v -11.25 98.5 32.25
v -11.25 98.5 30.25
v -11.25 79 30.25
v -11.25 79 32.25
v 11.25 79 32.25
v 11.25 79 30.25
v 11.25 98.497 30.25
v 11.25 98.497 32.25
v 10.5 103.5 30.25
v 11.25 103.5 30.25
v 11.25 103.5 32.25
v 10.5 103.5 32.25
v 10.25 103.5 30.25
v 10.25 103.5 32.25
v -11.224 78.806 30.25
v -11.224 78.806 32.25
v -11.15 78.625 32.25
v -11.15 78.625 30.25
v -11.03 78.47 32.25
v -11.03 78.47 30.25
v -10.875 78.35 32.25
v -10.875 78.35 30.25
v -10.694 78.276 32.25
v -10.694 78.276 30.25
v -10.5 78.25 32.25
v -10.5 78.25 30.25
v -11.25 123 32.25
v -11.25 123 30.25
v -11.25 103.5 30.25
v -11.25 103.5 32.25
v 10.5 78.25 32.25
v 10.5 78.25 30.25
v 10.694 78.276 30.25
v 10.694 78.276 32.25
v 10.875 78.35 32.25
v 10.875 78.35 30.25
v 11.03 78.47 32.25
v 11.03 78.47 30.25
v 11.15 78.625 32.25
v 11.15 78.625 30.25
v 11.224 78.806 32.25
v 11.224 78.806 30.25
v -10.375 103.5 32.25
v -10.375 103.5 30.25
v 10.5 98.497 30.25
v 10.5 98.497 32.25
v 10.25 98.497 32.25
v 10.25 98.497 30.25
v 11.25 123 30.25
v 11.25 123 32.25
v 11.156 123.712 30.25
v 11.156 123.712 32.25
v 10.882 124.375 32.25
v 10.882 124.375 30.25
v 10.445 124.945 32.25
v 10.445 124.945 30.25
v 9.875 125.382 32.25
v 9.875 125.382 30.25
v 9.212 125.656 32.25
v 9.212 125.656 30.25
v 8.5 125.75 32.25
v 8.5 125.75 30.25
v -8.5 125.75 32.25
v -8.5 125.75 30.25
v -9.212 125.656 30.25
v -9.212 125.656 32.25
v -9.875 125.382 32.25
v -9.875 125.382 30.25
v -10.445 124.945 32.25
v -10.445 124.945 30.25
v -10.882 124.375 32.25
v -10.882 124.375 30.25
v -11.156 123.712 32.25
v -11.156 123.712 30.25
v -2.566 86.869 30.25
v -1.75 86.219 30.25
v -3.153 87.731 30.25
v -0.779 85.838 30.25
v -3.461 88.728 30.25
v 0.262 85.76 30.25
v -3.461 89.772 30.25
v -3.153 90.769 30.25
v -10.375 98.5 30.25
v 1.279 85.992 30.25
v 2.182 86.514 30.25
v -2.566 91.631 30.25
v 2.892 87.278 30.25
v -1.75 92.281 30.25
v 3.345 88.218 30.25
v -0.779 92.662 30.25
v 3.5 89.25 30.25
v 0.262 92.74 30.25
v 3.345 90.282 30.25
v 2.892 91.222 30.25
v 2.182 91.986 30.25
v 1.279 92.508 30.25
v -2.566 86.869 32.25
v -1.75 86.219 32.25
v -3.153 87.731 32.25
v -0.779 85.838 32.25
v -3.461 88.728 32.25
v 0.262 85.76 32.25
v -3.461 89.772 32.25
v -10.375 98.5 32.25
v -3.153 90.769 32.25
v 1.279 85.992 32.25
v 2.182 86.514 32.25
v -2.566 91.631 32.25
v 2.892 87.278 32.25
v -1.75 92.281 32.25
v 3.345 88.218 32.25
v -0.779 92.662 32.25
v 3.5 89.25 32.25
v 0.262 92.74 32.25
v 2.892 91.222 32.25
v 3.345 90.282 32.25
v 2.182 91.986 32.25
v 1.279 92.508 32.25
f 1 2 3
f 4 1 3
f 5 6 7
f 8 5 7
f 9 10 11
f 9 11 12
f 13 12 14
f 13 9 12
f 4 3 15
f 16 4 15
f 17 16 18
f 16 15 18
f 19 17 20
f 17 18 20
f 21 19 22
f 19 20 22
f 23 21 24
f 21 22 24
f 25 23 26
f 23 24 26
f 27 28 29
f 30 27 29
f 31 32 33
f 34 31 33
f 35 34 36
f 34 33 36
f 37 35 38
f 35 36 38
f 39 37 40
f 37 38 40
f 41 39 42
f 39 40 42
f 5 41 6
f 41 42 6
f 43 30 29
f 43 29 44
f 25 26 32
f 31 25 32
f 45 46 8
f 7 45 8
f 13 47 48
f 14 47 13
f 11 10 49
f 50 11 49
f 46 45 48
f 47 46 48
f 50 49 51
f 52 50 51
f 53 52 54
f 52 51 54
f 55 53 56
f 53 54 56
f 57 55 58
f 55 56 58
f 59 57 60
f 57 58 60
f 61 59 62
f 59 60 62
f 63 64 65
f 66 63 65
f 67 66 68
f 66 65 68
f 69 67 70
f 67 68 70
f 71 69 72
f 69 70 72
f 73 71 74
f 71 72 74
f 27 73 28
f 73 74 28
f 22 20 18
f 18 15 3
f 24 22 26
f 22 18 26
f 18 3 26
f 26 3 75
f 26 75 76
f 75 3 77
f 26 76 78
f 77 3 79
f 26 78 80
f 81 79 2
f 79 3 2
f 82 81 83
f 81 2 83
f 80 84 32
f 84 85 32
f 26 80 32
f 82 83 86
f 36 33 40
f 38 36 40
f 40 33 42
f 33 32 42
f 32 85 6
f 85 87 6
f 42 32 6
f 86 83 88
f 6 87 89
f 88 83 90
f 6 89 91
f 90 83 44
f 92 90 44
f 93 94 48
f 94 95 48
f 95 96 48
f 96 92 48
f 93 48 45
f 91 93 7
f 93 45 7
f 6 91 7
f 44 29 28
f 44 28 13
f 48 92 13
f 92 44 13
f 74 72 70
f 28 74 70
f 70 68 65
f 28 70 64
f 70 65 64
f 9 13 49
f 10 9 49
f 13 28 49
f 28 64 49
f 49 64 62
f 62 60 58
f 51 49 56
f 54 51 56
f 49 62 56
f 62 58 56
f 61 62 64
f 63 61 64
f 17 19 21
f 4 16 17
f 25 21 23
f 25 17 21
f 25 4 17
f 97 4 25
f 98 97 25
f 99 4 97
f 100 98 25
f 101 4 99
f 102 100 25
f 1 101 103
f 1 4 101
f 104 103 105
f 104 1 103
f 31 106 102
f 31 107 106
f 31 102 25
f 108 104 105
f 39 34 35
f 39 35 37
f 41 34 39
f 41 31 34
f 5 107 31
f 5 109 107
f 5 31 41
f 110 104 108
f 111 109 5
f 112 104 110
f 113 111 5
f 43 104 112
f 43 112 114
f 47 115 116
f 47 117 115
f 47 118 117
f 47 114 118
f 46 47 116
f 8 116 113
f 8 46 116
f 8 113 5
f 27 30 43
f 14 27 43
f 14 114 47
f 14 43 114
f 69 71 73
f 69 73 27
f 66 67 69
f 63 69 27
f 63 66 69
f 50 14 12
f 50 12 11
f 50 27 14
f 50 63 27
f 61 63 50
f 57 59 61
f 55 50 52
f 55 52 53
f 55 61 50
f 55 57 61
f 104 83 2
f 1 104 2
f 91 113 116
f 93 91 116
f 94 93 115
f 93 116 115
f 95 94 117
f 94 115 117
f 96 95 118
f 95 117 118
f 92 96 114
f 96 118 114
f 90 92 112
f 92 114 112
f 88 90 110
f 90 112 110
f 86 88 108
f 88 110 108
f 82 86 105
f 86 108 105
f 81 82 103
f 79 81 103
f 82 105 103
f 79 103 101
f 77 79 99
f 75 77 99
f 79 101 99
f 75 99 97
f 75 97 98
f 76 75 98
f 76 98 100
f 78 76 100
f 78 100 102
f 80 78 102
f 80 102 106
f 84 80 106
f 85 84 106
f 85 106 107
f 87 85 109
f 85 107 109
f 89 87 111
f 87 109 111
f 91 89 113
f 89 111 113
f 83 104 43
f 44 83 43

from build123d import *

# Parameters (mm, degrees)
SKETCH1_W                = 20
SKETCH1_H                = 20
SKETCH1_R                = 4
SKETCH1_H_2              = 10
BOSS_EXTRUDE2_DEPTH      = 2
SKETCH2_W                = 45
SKETCH2_H                = 60
SKETCH2_W_2              = 43
SKETCH2_H_2              = 58
BOSS_EXTRUDE3_DEPTH      = 4
SKETCH6_W                = 45
SKETCH6_H                = 30
BOSS_EXTRUDE4_DEPTH      = 2
CUT_EXTRUDE4_DEPTH       = 4
BOSS_EXTRUDE5_DEPTH      = 7
BOSS_EXTRUDE5_2_DEPTH    = 7
BOSS_EXTRUDE5_3_DEPTH    = 7
SKETCH11_W               = 19
SKETCH11_H               = 19
BOSS_EXTRUDE6_DEPTH      = 2
SKETCH14_R               = 4
CUT_EXTRUDE7_DEPTH       = 19
SKETCH15_W               = 1
SKETCH15_H               = 17
SKETCH15_H_2             = 1
BOSS_EXTRUDE7_DEPTH      = 80
SKETCH16_W               = 16.5
SKETCH16_H               = 16.5
BOSS_EXTRUDE8_DEPTH      = 80
SKETCH17_R               = 4
CUT_EXTRUDE8_DEPTH       = 193
SKETCH18_W               = 105.72576136
SKETCH18_H               = 91
CUT_EXTRUDE9_DEPTH       = 193
SKETCH19_W               = 10.5
SKETCH19_H               = 2
CUT_EXTRUDE10_DEPTH      = 193
SKETCH20_W               = 16.5
SKETCH20_H               = 16.5
SKETCH20_R               = 4
BOSS_EXTRUDE10_DEPTH     = 80
SKETCH21_W               = 16.5
SKETCH21_H               = 16.5
SKETCH21_R               = 4
CUT_EXTRUDE11_DEPTH      = 80
SKETCH22_W               = 14
SKETCH22_H               = 5
CUT_EXTRUDE12_DEPTH      = 16
SKETCH24_W               = 16.5
SKETCH24_H               = 80
SKETCH24_W_2             = 14
SKETCH24_H_2             = 5
BOSS_EXTRUDE11_DEPTH     = 2
SKETCH25_R               = 4.1
SKETCH25_R_2             = 4
CUT_EXTRUDE14_DEPTH      = 103
SKETCH26_W               = 35
SKETCH26_H               = 40
BOSS_EXTRUDE12_DEPTH     = 5
SKETCH27_W               = 23
SKETCH27_H               = 5.75
CUT_EXTRUDE17_DEPTH      = 5
SKETCH28_W               = 2
SKETCH28_H               = 40
BOSS_EXTRUDE13_DEPTH     = 32
SKETCH29_W               = 4
SKETCH29_H               = 40
CUT_EXTRUDE18_DEPTH      = 32
SKETCH30_W               = 4
SKETCH30_H               = 40
CUT_EXTRUDE19_DEPTH      = 32
SKETCH31_W               = 10
SKETCH31_H               = 2
CUT_EXTRUDE20_DEPTH      = 32
SKETCH34_W               = 44.25
SKETCH34_H               = 2
BOSS_EXTRUDE15_DEPTH     = 23
FILLET1_R                = 3
FILLET2_R                = 3
FILLET3_R                = 3
FILLET4_R                = 3
BOSS_EXTRUDE16_DEPTH     = 20
SKETCH36_W               = 10
SKETCH36_H               = 2
BOSS_EXTRUDE17_DEPTH     = 23
SKETCH37_W               = 27
SKETCH37_H               = 20
CUT_EXTRUDE23_DEPTH      = 1
SKETCH42_W               = 1
SKETCH42_H               = 5
BOSS_EXTRUDE22_DEPTH     = 2
SKETCH44_W               = 1
SKETCH44_H               = 2
BOSS_EXTRUDE23_DEPTH     = 2
SKETCH46_W               = 1
SKETCH46_H               = 2
BOSS_EXTRUDE24_DEPTH     = 3
SKETCH47_W               = 16.5
SKETCH47_H               = 18.5
SKETCH47_R               = 4.1
BOSS_EXTRUDE25_DEPTH     = 2
SKETCH50_W               = 14
SKETCH50_H               = 18
SKETCH50_R               = 4.1
CUT_EXTRUDE26_DEPTH      = 2
SKETCH51_W               = 18
SKETCH51_H               = 7
CUT_EXTRUDE27_DEPTH      = 0.5
SKETCH52_W               = 18
SKETCH52_H               = 7
CUT_EXTRUDE28_DEPTH      = 0.5
SKETCH53_W               = 18.5
SKETCH53_H               = 82
BOSS_EXTRUDE26_DEPTH     = 0.5
SKETCH54_W               = 18.5
SKETCH54_H               = 82
BOSS_EXTRUDE27_DEPTH     = 0.5
BOSS_EXTRUDE30_DEPTH     = 5
CUT_EXTRUDE31_REACH      = 138.104
SKETCH61_W               = 23
SKETCH61_H               = 5
CUT_EXTRUDE32_DEPTH      = 25
CUT_EXTRUDE32_DEPTH_BACK = 5
SKETCH62_W               = 6.75
SKETCH62_H               = 5
BOSS_EXTRUDE31_DEPTH     = 10.25
BOSS_EXTRUDE32_DEPTH     = 6
SKETCH65_W               = 23
SKETCH65_H               = 2
BOSS_EXTRUDE33_DEPTH     = 6
FILLET5_R                = 3
FILLET6_R                = 3
FILLET7_R                = 1
FILLET8_R                = 1
SKETCH66_W               = 1
SKETCH66_H               = 1
CUT_EXTRUDE33_DEPTH      = 5
BOSS_EXTRUDE34_DEPTH     = 6
SKETCH68_W               = 17
SKETCH68_H               = 15
BOSS_EXTRUDE35_DEPTH     = 6
BOSS_EXTRUDE37_DEPTH     = 15
SKETCH72_W               = 3
SKETCH72_H               = 15
BOSS_EXTRUDE38_DEPTH     = 3
SKETCH75_W               = 6.5
SKETCH75_H               = 31.5
BOSS_EXTRUDE39_DEPTH     = 2
SKETCH76_W               = 6.5
SKETCH76_H               = 2
BOSS_EXTRUDE40_DEPTH     = 31.5
SKETCH77_W               = 1
SKETCH77_H               = 5.002530781
SKETCH77_H_2             = 5
CUT_EXTRUDE34_DEPTH      = 8
SKETCH78_W               = 0.75
SKETCH78_H               = 5.002565684
SKETCH78_H_2             = 5
CUT_EXTRUDE35_DEPTH      = 2
SKETCH79_W               = 0.75
SKETCH79_H               = 5.002530781
SKETCH79_W_2             = 0.875
SKETCH79_H_2             = 5
BOSS_EXTRUDE42_DEPTH     = 2
SKETCH80_R               = 3.5
CUT_EXTRUDE37_DEPTH      = 2
CUT_EXTRUDE38_DEPTH      = 32


with BuildPart() as part:
    # Sketch1 → Boss-Extrude2 (new body)
    # profile 1 of 6: a face of its own
    with BuildSketch(Plane(origin=(0, 0, 0), x_dir=(1, 0, 0), z_dir=(0, 1, 0))):
        Polygon((-22.5, 10), (-10, 10), (10, 10), (22.5, 10), (22.5, 70), (-22.5, 70), align=None)
    # profile 2 of 6: a face of its own
    with BuildSketch(Plane(origin=(0, 0, 0), x_dir=(1, 0, 0), z_dir=(0, 1, 0))):
        Polygon((-22.5, 10), (-10, -10), (-10, 10), align=None)
    # profile 3 of 6: a face of its own
    with BuildSketch(Plane(origin=(0, 0, 0), x_dir=(1, 0, 0), z_dir=(0, 1, 0))):
        Polygon((10, 10), (10, -10), (22.5, 10), align=None)
    # profile 4 of 6: a face of its own
    with BuildSketch(Plane(origin=(0, 0, 0), x_dir=(1, 0, 0), z_dir=(0, 1, 0))):
        Rectangle(SKETCH1_W, SKETCH1_H)
        Circle(SKETCH1_R, mode=Mode.SUBTRACT)
    # profile 5 of 6: a face of its own
    with BuildSketch(Plane(origin=(0, 0, 0), x_dir=(1, 0, 0), z_dir=(0, 1, 0))):
        Circle(SKETCH1_R)
    # profile 6 of 6: a face of its own
    with BuildSketch(Plane(origin=(0, 0, 0), x_dir=(1, 0, 0), z_dir=(0, 1, 0))):
        with Locations((0, -15)):
            Rectangle(SKETCH1_W, SKETCH1_H_2)
    extrude(amount=BOSS_EXTRUDE2_DEPTH)

    # Sketch2 → Boss-Extrude3 (add)
    with BuildSketch(Plane(origin=(0, 2, 0), x_dir=(1, 0, 0), z_dir=(0, 1, 0))):
        with Locations((0, 40)):
            Rectangle(SKETCH2_W, SKETCH2_H)
        with Locations((0, 40)):
            Rectangle(SKETCH2_W_2, SKETCH2_H_2, mode=Mode.SUBTRACT)
    extrude(amount=BOSS_EXTRUDE3_DEPTH)

    # Sketch6 → Boss-Extrude4 (add)
    with BuildSketch(Plane(origin=(0, 2, 0), x_dir=(1, 0, 0), z_dir=(0, 1, 0))):
        with Locations((0, -5)):
            Rectangle(SKETCH6_W, SKETCH6_H)
    extrude(amount=-BOSS_EXTRUDE4_DEPTH)

    # Sketch7 → Cut-Extrude4 (cut)
    with BuildSketch(Plane(origin=(0, 2, 0), x_dir=(1, 0, 0), z_dir=(0, 1, 0))):
        with BuildLine():
            Line((9.5, 9.5), (-9.5, 9.5))
            Line((-9.5, 9.5), (-9.5, 2.122498999))
            ThreePointArc((-9.5, 2.122498999), (0, 9), (9.5, 2.122498999))
            Line((9.5, 2.122498999), (9.5, 9.5))
        make_face()
        with BuildLine():
            ThreePointArc((-5.267826876, -9.5), (-7.858215886, -7.184532568), (-9.5, -4.122498999))
            Line((-9.5, -4.122498999), (-9.5, -9.5))
            Line((-9.5, -9.5), (-5.267826876, -9.5))
        make_face()
        with BuildLine():
            Line((9.5, -9.5), (9.5, -4.122498999))
            ThreePointArc((9.5, -4.122498999), (7.858215886, -7.184532568), (5.267826876, -9.5))
            Line((5.267826876, -9.5), (9.5, -9.5))
        make_face()
    extrude(amount=-CUT_EXTRUDE4_DEPTH, mode=Mode.SUBTRACT)


with BuildPart() as body_2:
    # Sketch8 → Boss-Extrude5 (new body)
    with BuildSketch(Plane(origin=(0, 2, 0), x_dir=(1, 0, 0), z_dir=(0, 1, 0))):
        with BuildLine():
            Line((9.5, 2.122498999), (9.5, 9.5))
            Line((9.5, 9.5), (-9.5, 9.5))
            Line((-9.5, 9.5), (-9.5, 2.122498999))
            ThreePointArc((-9.5, 2.122498999), (0, 9), (9.5, 2.122498999))
        make_face()
    extrude(amount=BOSS_EXTRUDE5_DEPTH)



with BuildPart() as body_3:
    # Sketch8 → Boss-Extrude5 2 (new body)
    with BuildSketch(Plane(origin=(0, 2, 0), x_dir=(1, 0, 0), z_dir=(0, 1, 0))):
        with BuildLine():
            Line((-9.5, -9.5), (-5.267826876, -9.5))
            ThreePointArc((-5.267826876, -9.5), (-7.858215886, -7.184532568), (-9.5, -4.122498999))
            Line((-9.5, -4.122498999), (-9.5, -9.5))
        make_face()
    extrude(amount=BOSS_EXTRUDE5_2_DEPTH)


with BuildPart() as body_4:
    # Sketch8 → Boss-Extrude5 3 (new body)
    with BuildSketch(Plane(origin=(0, 2, 0), x_dir=(1, 0, 0), z_dir=(0, 1, 0))):
        with BuildLine():
            Line((9.5, -9.5), (9.5, -4.122498999))
            ThreePointArc((9.5, -4.122498999), (7.858215886, -7.184532568), (5.267826876, -9.5))
            Line((5.267826876, -9.5), (9.5, -9.5))
        make_face()
    extrude(amount=BOSS_EXTRUDE5_3_DEPTH)


with BuildPart() as body_2_1:
    add(body_2.part)

    add(body_3.part)  # Boss-Extrude6 merges body 3

    add(body_4.part)  # Boss-Extrude6 merges body 4
    # Sketch11 → Boss-Extrude6 (add)
    with BuildSketch(Plane(origin=(0, 9, 0), x_dir=(1, 0, 0), z_dir=(0, 1, 0))):
        Rectangle(SKETCH11_W, SKETCH11_H)
    extrude(amount=BOSS_EXTRUDE6_DEPTH)


with BuildPart() as cut_extrude7_tool:
    # Sketch14 → Cut-Extrude7 (new body)
    with BuildSketch(Plane.XZ):
        with Locations(Location((0, 1, 0), (0, 0, 270))):
            Circle(SKETCH14_R)
    extrude(amount=-CUT_EXTRUDE7_DEPTH)


with BuildPart() as part_1:
    add(part.part)

    # Cut-Extrude7: cut by cut_extrude7_tool
    add(cut_extrude7_tool.part, mode=Mode.SUBTRACT)


with BuildPart() as body_2_2:
    add(body_2_1.part)

    # Cut-Extrude7: cut by cut_extrude7_tool
    add(cut_extrude7_tool.part, mode=Mode.SUBTRACT)

    # Sketch15 → Boss-Extrude7 (add)
    with BuildSketch(Plane(origin=(0, 11, 0), x_dir=(1, 0, 0), z_dir=(0, 1, 0))):
        Polygon((-8.5, 8.5), (8.5, 8.5), (8.5, 9.5), (-9.5, 9.5), (-9.5, -9.5), (8.5, -9.5), (8.5, -8.5), (-8.5, -8.5), align=None)
        with Locations((9, 0)):
            Rectangle(SKETCH15_W, SKETCH15_H)
        with Locations((9, 9)):
            Rectangle(SKETCH15_W, SKETCH15_H_2)
        with Locations((9, -9)):
            Rectangle(SKETCH15_W, SKETCH15_H_2)
    extrude(amount=BOSS_EXTRUDE7_DEPTH)


with BuildPart() as body_3_2:
    # Sketch16 → Boss-Extrude8 (new body)
    with BuildSketch(Plane(origin=(0, 91, 0), x_dir=(1, 0, 0), z_dir=(0, 1, 0))):
        Rectangle(SKETCH16_W, SKETCH16_H)
    extrude(amount=BOSS_EXTRUDE8_DEPTH)

    # Sketch17 → Cut-Extrude8 (cut)
    with BuildSketch(Plane.XZ):
        with Locations(Location((0, 1, 0), (0, 0, 270))):
            Circle(SKETCH17_R)
    extrude(amount=-CUT_EXTRUDE8_DEPTH, mode=Mode.SUBTRACT)

    # Sketch20 → Boss-Extrude10 (add)
    with BuildSketch(Plane.XZ.offset(-91)):
        Rectangle(SKETCH20_W, SKETCH20_H)
        with Locations(Location((0, 1, 0), (0, 0, 270))):
            Circle(SKETCH20_R, mode=Mode.SUBTRACT)
    extrude(amount=BOSS_EXTRUDE10_DEPTH)

    # Sketch21 → Cut-Extrude11 (cut)
    with BuildSketch(Plane(origin=(0, 171, 0), x_dir=(1, 0, 0), z_dir=(0, 1, 0))):
        Rectangle(SKETCH21_W, SKETCH21_H)
        with Locations(Location((0, -1, 0), (0, 0, 90))):
            Circle(SKETCH21_R, mode=Mode.SUBTRACT)
    extrude(amount=-CUT_EXTRUDE11_DEPTH, mode=Mode.SUBTRACT)

    # Sketch22 → Cut-Extrude12 (cut)
    with BuildSketch(Plane.XY.offset(8.25)):
        with Locations((0, 15.5)):
            Rectangle(SKETCH22_W, SKETCH22_H)
    extrude(amount=-CUT_EXTRUDE12_DEPTH, mode=Mode.SUBTRACT)

    # Sketch24 → Boss-Extrude11 (add)
    with BuildSketch(Plane.XY.offset(8.25)):
        with Locations((0, 51)):
            Rectangle(SKETCH24_W, SKETCH24_H)
        with Locations((0, 15.5)):
            Rectangle(SKETCH24_W_2, SKETCH24_H_2, mode=Mode.SUBTRACT)
    extrude(amount=BOSS_EXTRUDE11_DEPTH)

    # Sketch25 → Cut-Extrude14 (cut)
    with BuildSketch(Plane(origin=(0, 91, 0), x_dir=(1, 0, 0), z_dir=(0, 1, 0))):
        with Locations(Location((0, -1, 0), (0, 0, 270))):
            Circle(SKETCH25_R)
        with Locations((0, -1)):
            Circle(SKETCH25_R_2, mode=Mode.SUBTRACT)
    extrude(amount=-CUT_EXTRUDE14_DEPTH, mode=Mode.SUBTRACT)

    # Sketch26 → Boss-Extrude12 (add)
    with BuildSketch(Plane(origin=(0, 91, 0), x_dir=(1, 0, 0), z_dir=(0, 1, 0))):
        Rectangle(SKETCH26_W, SKETCH26_H)
    extrude(amount=BOSS_EXTRUDE12_DEPTH)

    # Sketch27 → Cut-Extrude17 (cut)
    with BuildSketch(Plane(origin=(0, 96, 0), x_dir=(1, 0, 0), z_dir=(0, 1, 0))):
        with Locations((0, -17.125)):
            Rectangle(SKETCH27_W, SKETCH27_H)
    extrude(amount=-CUT_EXTRUDE17_DEPTH, mode=Mode.SUBTRACT)

    # Sketch28 → Boss-Extrude13 (add)
    with BuildSketch(Plane(origin=(0, 96, 0), x_dir=(1, 0, 0), z_dir=(0, 1, 0))):
        with Locations((12.5, 0)):
            Rectangle(SKETCH28_W, SKETCH28_H)
        with Locations((-12.5, 0)):
            Rectangle(SKETCH28_W, SKETCH28_H)
    extrude(amount=BOSS_EXTRUDE13_DEPTH)

    # Sketch29 → Cut-Extrude18 (cut)
    with BuildSketch(Plane(origin=(0, 96, 0), x_dir=(1, 0, 0), z_dir=(0, 1, 0))):
        with Locations((-15.5, 0)):
            Rectangle(SKETCH29_W, SKETCH29_H)
    extrude(amount=-CUT_EXTRUDE18_DEPTH, mode=Mode.SUBTRACT)

    # Sketch30 → Cut-Extrude19 (cut)
    with BuildSketch(Plane(origin=(0, 96, 0), x_dir=(1, 0, 0), z_dir=(0, 1, 0))):
        with Locations((15.5, 0)):
            Rectangle(SKETCH30_W, SKETCH30_H)
    extrude(amount=-CUT_EXTRUDE19_DEPTH, mode=Mode.SUBTRACT)

    # Sketch31 → Cut-Extrude20 (cut)
    with BuildSketch(Plane(origin=(0, 96, 0), x_dir=(1, 0, 0), z_dir=(0, 1, 0))):
        with Locations((0, 19)):
            Rectangle(SKETCH31_W, SKETCH31_H)
    extrude(amount=-CUT_EXTRUDE20_DEPTH, mode=Mode.SUBTRACT)

    # Sketch34 → Boss-Extrude15 (add)
    with BuildSketch(Plane.ZY.offset(-11.5)):
        with Locations((2.125, 127)):
            Rectangle(SKETCH34_W, SKETCH34_H)
    extrude(amount=BOSS_EXTRUDE15_DEPTH)

    # Fillet1
    fillet1_edges = [body_3_2.edges().sort_by_distance(p)[0] for p in [
        (-13.5, 128, 0),
    ]]
    fillet(fillet1_edges, radius=FILLET1_R)

    # Fillet2
    fillet2_edges = [body_3_2.edges().sort_by_distance(p)[0] for p in [
        (13.5, 128, 0),
    ]]
    fillet(fillet2_edges, radius=FILLET2_R)

    # Fillet3
    # the kernel refuses this fillet: 3 mm, written as the material it adds along each edge
    with BuildSketch(Plane(origin=(-11.5, 126, 27.5), x_dir=(1, 0, 0), z_dir=(0, 0, -1))) as fillet3_piece_1_section:
        with BuildLine():
            CenterArc((FILLET3_R, FILLET3_R), FILLET3_R, 180, 90)
            Line((0, FILLET3_R), (0, 0))
            Line((0, 0), (FILLET3_R, 0))
        make_face()
    fillet3_piece_1 = extrude(amount=47.5, mode=Mode.PRIVATE)
    fillet3_piece_1 = split(fillet3_piece_1, bisect_by=Plane(origin=(-11.5, 126, 24.25), z_dir=(0, 0, -1)), keep=Keep.TOP, mode=Mode.PRIVATE)
    fillet3_piece_1 = split(fillet3_piece_1, bisect_by=Plane(origin=(-11.5, 126, 27.5), z_dir=(1, 0, 0)), keep=Keep.TOP, mode=Mode.PRIVATE)
    fillet3_piece_1 = split(fillet3_piece_1, bisect_by=Plane(origin=(-11.5, 126, 20), z_dir=(0, 0, 1)), keep=Keep.TOP, mode=Mode.PRIVATE)
    add(fillet3_piece_1)
    with BuildSketch(Plane(origin=(-11.5, 126, 20), x_dir=(1, 0, 0), z_dir=(0, 0, -1))) as fillet3_piece_2_section:
        with BuildLine():
            CenterArc((FILLET3_R, FILLET3_R), FILLET3_R, 180, 90)
            Line((0, FILLET3_R), (0, 0))
            Line((0, 0), (FILLET3_R, 0))
        make_face()
    fillet3_piece_2 = extrude(amount=40, mode=Mode.PRIVATE)
    fillet3_piece_2 = split(fillet3_piece_2, bisect_by=Plane(origin=(-11.5, 126, 20), z_dir=(1, 0, 0)), keep=Keep.TOP, mode=Mode.PRIVATE)
    add(fillet3_piece_2)

    # Fillet4
    # the kernel refuses this fillet: 3 mm, written as the material it adds along each edge
    with BuildSketch(Plane(origin=(11.5, 126, 27.5), x_dir=(0, -1, 0), z_dir=(0, 0, -1))) as fillet4_piece_1_section:
        with BuildLine():
            CenterArc((FILLET4_R, FILLET4_R), FILLET4_R, 180, 90)
            Line((0, FILLET4_R), (0, 0))
            Line((0, 0), (FILLET4_R, 0))
        make_face()
    fillet4_piece_1 = extrude(amount=47.5, mode=Mode.PRIVATE)
    fillet4_piece_1 = split(fillet4_piece_1, bisect_by=Plane(origin=(11.5, 126, 20), z_dir=(0, 0, 1)), keep=Keep.TOP, mode=Mode.PRIVATE)
    fillet4_piece_1 = split(fillet4_piece_1, bisect_by=Plane(origin=(11.5, 126, 27.5), z_dir=(-1, 0, 0)), keep=Keep.TOP, mode=Mode.PRIVATE)
    fillet4_piece_1 = split(fillet4_piece_1, bisect_by=Plane(origin=(11.5, 126, 24.25), z_dir=(0, 0, -1)), keep=Keep.TOP, mode=Mode.PRIVATE)
    add(fillet4_piece_1)
    with BuildSketch(Plane(origin=(11.5, 126, 20), x_dir=(0, -1, 0), z_dir=(0, 0, -1))) as fillet4_piece_2_section:
        with BuildLine():
            CenterArc((FILLET4_R, FILLET4_R), FILLET4_R, 180, 90)
            Line((0, FILLET4_R), (0, 0))
            Line((0, 0), (FILLET4_R, 0))
        make_face()
    fillet4_piece_2 = extrude(amount=40, mode=Mode.PRIVATE)
    fillet4_piece_2 = split(fillet4_piece_2, bisect_by=Plane(origin=(11.5, 126, 20), z_dir=(-1, 0, 0)), keep=Keep.TOP, mode=Mode.PRIVATE)
    add(fillet4_piece_2)

    # Boss-Extrude16: read off the stored shape, not the designer's step
    # Boss-Extrude16 outline → Boss-Extrude16 (add)
    with BuildSketch(Plane.XZ.offset(-91)):
        Polygon((11.5, 20), (11.5, 14.25), (-11.5, 14.25), (-11.5, 20), (-13.5, 20), (-13.5, 12.25), (13.5, 12.25), (13.5, 20), align=None)
    extrude(amount=BOSS_EXTRUDE16_DEPTH)

    # Sketch36 → Boss-Extrude17 (add)
    with BuildSketch(Plane.ZY.offset(-11.5)):
        with Locations((19.25, 72)):
            Rectangle(SKETCH36_W, SKETCH36_H)
    extrude(amount=BOSS_EXTRUDE17_DEPTH)

    # Sketch37 → Cut-Extrude23 (cut)
    with BuildSketch(Plane(origin=(0, 0, 12.25), x_dir=(-1, 0, 0), z_dir=(0, 0, -1))):
        with Locations((0, 81)):
            Rectangle(SKETCH37_W, SKETCH37_H)
    extrude(amount=-CUT_EXTRUDE23_DEPTH, mode=Mode.SUBTRACT)

    # Sketch47 → Boss-Extrude25 (add)
    with BuildSketch(Plane.XZ.offset(-11)):
        with Locations((0, 1)):
            Rectangle(SKETCH47_W, SKETCH47_H)
        with Locations(Location((0, 1, 0), (0, 0, 90))):
            Circle(SKETCH47_R, mode=Mode.SUBTRACT)
    extrude(amount=BOSS_EXTRUDE25_DEPTH)

    # Sketch50 → Cut-Extrude26 (cut)
    with BuildSketch(Plane(origin=(0, 13, 0), x_dir=(1, 0, 0), z_dir=(0, 1, 0))):
        with Locations((0, -1.25)):
            Rectangle(SKETCH50_W, SKETCH50_H)
        with Locations(Location((0, -1, 0), (0, 0, 270))):
            Circle(SKETCH50_R, mode=Mode.SUBTRACT)
    extrude(amount=-CUT_EXTRUDE26_DEPTH, mode=Mode.SUBTRACT)

    # Sketch51 → Cut-Extrude27 (cut)
    with BuildSketch(Plane(origin=(-7, 0, 0), x_dir=(0, 0, -1), z_dir=(1, 0, 0))):
        with Locations((-1.25, 14.5)):
            Rectangle(SKETCH51_W, SKETCH51_H)
    extrude(amount=-CUT_EXTRUDE27_DEPTH, mode=Mode.SUBTRACT)

    # Sketch52 → Cut-Extrude28 (cut)
    with BuildSketch(Plane.ZY.offset(-7)):
        with Locations((1.25, 14.5)):
            Rectangle(SKETCH52_W, SKETCH52_H)
    extrude(amount=-CUT_EXTRUDE28_DEPTH, mode=Mode.SUBTRACT)

    # Sketch53 → Boss-Extrude26 (add)
    with BuildSketch(Plane.ZY.offset(8.25)):
        with Locations((1, 50)):
            Rectangle(SKETCH53_W, SKETCH53_H)
    extrude(amount=BOSS_EXTRUDE26_DEPTH)

    # Sketch54 → Boss-Extrude27 (add)
    with BuildSketch(Plane(origin=(8.25, 0, 0), x_dir=(0, 0, -1), z_dir=(1, 0, 0))):
        with Locations((-1, 50)):
            Rectangle(SKETCH54_W, SKETCH54_H)
    extrude(amount=BOSS_EXTRUDE27_DEPTH)

    # Sketch59 → Boss-Extrude30 (add)
    with BuildSketch(Plane(origin=(0, 73, 0), x_dir=(1, 0, 0), z_dir=(0, 1, 0))):
        Polygon((-11.5, -20), (-11.5, -24.25), (11.5, -24.25), (11.5, -20), (11.5, -14.25), (-11.5, -14.25), align=None)
    extrude(amount=BOSS_EXTRUDE30_DEPTH)

    # Cut-Extrude31: up to this face of the body (flat: up to its plane)
    cut_extrude31_end = Plane(body_3_2.part.faces().sort_by_distance((0, 81, 13.25))[0])
    # Sketch61 → Cut-Extrude31 (cut, up to the picked face)
    with BuildSketch(Plane.XY.offset(24.25), mode=Mode.PRIVATE) as cut_extrude31_sk1:
        with Locations((0, 73.5)):
            Rectangle(SKETCH61_W, SKETCH61_H)
    cut_extrude31_tool1 = split(extrude(cut_extrude31_sk1.sketch, amount=-CUT_EXTRUDE31_REACH, mode=Mode.PRIVATE), bisect_by=cut_extrude31_end, keep=Keep.BOTH, mode=Mode.PRIVATE)
    add(cut_extrude31_tool1.solids().sort_by(Axis((0, 73.5, 24.25), (0, 0, -1)))[0], mode=Mode.SUBTRACT)

    # Sketch62 → Cut-Extrude32 (cut, two sides: drawn at the far end of the back side and taken through both)
    with BuildSketch(Plane(origin=(-11.5, 0, 0), x_dir=(0, 0, -1), z_dir=(1, 0, 0)).offset(-CUT_EXTRUDE32_DEPTH_BACK)):
        with Locations((-16.625, 73.5)):
            Rectangle(SKETCH62_W, SKETCH62_H)
    extrude(amount=CUT_EXTRUDE32_DEPTH + CUT_EXTRUDE32_DEPTH_BACK, mode=Mode.SUBTRACT)



with BuildPart() as cut_extrude9_tool:
    # Sketch18 → Cut-Extrude9 (new body)
    with BuildSketch(Plane.ZY.offset(22.5)):
        with Locations((-43.36288068, 45.5)):
            Rectangle(SKETCH18_W, SKETCH18_H)
    extrude(amount=-CUT_EXTRUDE9_DEPTH)


with BuildPart() as part_2:
    add(part_1.part)

    # Cut-Extrude9: cut by cut_extrude9_tool
    add(cut_extrude9_tool.part, mode=Mode.SUBTRACT)

    # Sketch19 → Cut-Extrude10 (cut)
    with BuildSketch(Plane.ZY.offset(22.5)):
        with Locations((14.75, 1)):
            Rectangle(SKETCH19_W, SKETCH19_H)
    extrude(amount=-CUT_EXTRUDE10_DEPTH, mode=Mode.SUBTRACT)


with BuildPart() as body_2_3:
    add(body_2_2.part)

    # Cut-Extrude9: cut by cut_extrude9_tool
    add(cut_extrude9_tool.part, mode=Mode.SUBTRACT)


with BuildPart() as body_2_2_1:
    # Sketch42 → Boss-Extrude22 (new body)
    with BuildSketch(Plane.XY.offset(30.25)):
        with Locations((-11, 101)):
            Rectangle(SKETCH42_W, SKETCH42_H)
    extrude(amount=-BOSS_EXTRUDE22_DEPTH)


with BuildPart() as body_3_3:
    # Sketch44 → Boss-Extrude23 (new body)
    with BuildSketch(Plane.XY.offset(30.25)):
        with Locations((11, 99.5)):
            Rectangle(SKETCH44_W, SKETCH44_H)
    extrude(amount=-BOSS_EXTRUDE23_DEPTH)

    # Sketch46 → Boss-Extrude24 (add)
    with BuildSketch(Plane(origin=(0, 100.5, 0), x_dir=(1, 0, 0), z_dir=(0, 1, 0))):
        with Locations((11, -29.25)):
            Rectangle(SKETCH46_W, SKETCH46_H)
    extrude(amount=BOSS_EXTRUDE24_DEPTH)


with BuildPart() as body_3_2_1:
    add(body_3_2.part)

    add(body_2_2_1.part)  # Boss-Extrude31 merges body 2 2

    add(body_3_3.part)  # Boss-Extrude31 merges body 3 3
    # Sketch63 → Boss-Extrude31 (add)
    with BuildSketch(Plane.XY.offset(20)):
        with BuildLine():
            Line((-13.5, 76), (-11.5, 76))
            Line((-11.5, 76), (-11.5, 78))
            Line((-11.5, 78), (-11.5, 123))
            Line((-11.5, 123), (-11.5, 127.828427125))
            ThreePointArc((-11.5, 127.828427125), (-12.949489743, 126.732050808), (-13.5, 125))
            Line((-13.5, 125), (-13.5, 76))
        make_face()
        with BuildLine():
            Line((11.5, 76), (13.5, 76))
            Line((13.5, 76), (13.5, 125))
            ThreePointArc((13.5, 125), (12.949489743, 126.732050808), (11.5, 127.828427125))
            Line((11.5, 127.828427125), (11.5, 123))
            Line((11.5, 123), (11.5, 78))
            Line((11.5, 78), (11.5, 76))
        make_face()
    extrude(amount=BOSS_EXTRUDE31_DEPTH)


with BuildPart() as boss_extrude32_tool:
    # Sketch64 → Boss-Extrude32 (new body)
    with BuildSketch(Plane.XY.offset(24.25)):
        with BuildLine():
            Line((11.5, 123.000004494), (11.5, 127.828427125))
            ThreePointArc((11.5, 127.828427125), (11.007305936, 127.956795679), (10.5, 128))
            Line((10.5, 128), (-10.5, 128))
            ThreePointArc((-10.5, 128), (-11.007305936, 127.956795679), (-11.5, 127.828427125))
            Line((-11.5, 127.828427125), (-11.5, 123.000004494))
            ThreePointArc((-11.5, 123.000004494), (-10.621318755, 125.121321932), (-8.5, 126))
            Line((-8.5, 126), (8.5, 126))
            ThreePointArc((8.5, 126), (10.621318755, 125.121321932), (11.5, 123.000004494))
        make_face()
    extrude(amount=BOSS_EXTRUDE32_DEPTH)


with BuildPart() as body_3_2_2:
    add(body_3_2_1.part)


with BuildPart() as body_3_2_3:
    # Boss-Extrude32: joined with boss_extrude32_tool
    add(body_3_2_2.part.fuse(boss_extrude32_tool.part, tol=0.00001))

    # Sketch65 → Boss-Extrude33 (add)
    with BuildSketch(Plane.XY.offset(24.25)):
        with Locations((0, 77)):
            Rectangle(SKETCH65_W, SKETCH65_H)
    extrude(amount=BOSS_EXTRUDE33_DEPTH)

    # Fillet5
    fillet5_edges = [body_3_2_3.edges().sort_by_distance(p)[0] for p in [
        (13.5, 76, 21.75),
    ]]
    fillet(fillet5_edges, radius=FILLET5_R)

    # Fillet6
    fillet6_edges = [body_3_2_3.edges().sort_by_distance(p)[0] for p in [
        (-13.5, 76, 21.75),
    ]]
    fillet(fillet6_edges, radius=FILLET6_R)

    # Fillet7
    fillet7_edges = [body_3_2_3.edges().sort_by_distance(p)[0] for p in [
        (-11.5, 78, 22.25),
    ]]
    fillet(fillet7_edges, radius=FILLET7_R)

    # Fillet8
    fillet8_edges = [body_3_2_3.edges().sort_by_distance(p)[0] for p in [
        (11.5, 78, 22.25),
    ]]
    fillet(fillet8_edges, radius=FILLET8_R)

    # Sketch66 → Cut-Extrude33 (cut)
    with BuildSketch(Plane(origin=(0, 103.5, 0), x_dir=(1, 0, 0), z_dir=(0, 1, 0))):
        with Locations((-11, -28.75)):
            Rectangle(SKETCH66_W, SKETCH66_H)
        Polygon((-10.5, -29.25), (-10.5, -30.25), (-11.5, -30.25), align=None)
        Polygon((11.5, -30.25), (10.5, -29.25), (10.5, -30.25), align=None)
        with Locations((11, -28.75)):
            Rectangle(SKETCH66_W, SKETCH66_H)
    extrude(amount=-CUT_EXTRUDE33_DEPTH, mode=Mode.SUBTRACT)

    # Sketch67 → Boss-Extrude34 (add)
    with BuildSketch(Plane(origin=(0, 96, 0), x_dir=(1, 0, 0), z_dir=(0, 1, 0))):
        Polygon((5, 5), (5, 18), (-5, 18), (-5, 20), (-11.5, 20), (-11.5, 5), align=None)
        Polygon((11.5, 20), (5, 20), (5, 18), (5, 5), (11.5, 5), align=None)
    extrude(amount=BOSS_EXTRUDE34_DEPTH)

    # Sketch68 → Boss-Extrude35 (add)
    with BuildSketch(Plane.XZ.offset(-126)):
        with Locations((0, -12.5)):
            Rectangle(SKETCH68_W, SKETCH68_H)
    extrude(amount=BOSS_EXTRUDE35_DEPTH)

    # Sketch71 → Boss-Extrude37 (add)
    with BuildSketch(Plane(origin=(0, 0, -20), x_dir=(-1, 0, 0), z_dir=(0, 0, -1))):
        with BuildLine():
            ThreePointArc((-8.5, 126), (-10.621320344, 125.121320344), (-11.5, 123))
            Line((-11.5, 123), (-8.5, 123))
            Line((-8.5, 123), (-8.5, 126))
        make_face()
        with BuildLine():
            Line((8.5, 123), (11.5, 123))
            ThreePointArc((11.5, 123), (10.621320344, 125.121320344), (8.5, 126))
            Line((8.5, 126), (8.5, 123))
        make_face()
    extrude(amount=-BOSS_EXTRUDE37_DEPTH)

    # Sketch72 → Boss-Extrude38 (add)
    with BuildSketch(Plane.XZ.offset(-123)):
        with Locations((-10, -12.5)):
            Rectangle(SKETCH72_W, SKETCH72_H)
        with Locations((10, -12.5)):
            Rectangle(SKETCH72_W, SKETCH72_H)
    extrude(amount=BOSS_EXTRUDE38_DEPTH)

    # Sketch81 → Cut-Extrude38 (cut)
    with BuildSketch(Plane(origin=(13.5, 0, 0), x_dir=(0, 0, -1), z_dir=(1, 0, 0))):
        Polygon((-30.25, 162.009758307), (-30.25, 125), (20, 125), (70.52683885, 125), (70.52683885, 162.009758307), align=None)
        Polygon((20, 125), (-30.25, 125), (-30.25, 79), (-13.25, 79), (-13.25, 91), (20, 91), align=None)
        Polygon((70.52683885, 125), (20, 125), (20, 91), (-13.25, 91), (-13.25, 79), (-30.25, 79), (-30.25, -38.82202192), (71.500818081, -38.82202192), (71.500818081, 125), align=None)
    extrude(amount=-CUT_EXTRUDE38_DEPTH, mode=Mode.SUBTRACT)


with BuildPart() as body_2_3_1:
    # Sketch75 → Boss-Extrude39 (new body)
    with BuildSketch(Plane.XY.offset(30.25)):
        with BuildLine():
            Line((-10.5, 78.25), (10.5, 78.25))
            ThreePointArc((10.5, 78.25), (11.030330086, 78.469669914), (11.25, 79))
            Line((11.25, 79), (11.25, 98.5))
            Line((11.25, 98.5), (11.25, 103.5))
            Line((11.25, 103.5), (11.25, 123))
            ThreePointArc((11.25, 123), (10.444543648, 124.944543648), (8.5, 125.75))
            Line((8.5, 125.75), (-8.5, 125.75))
            ThreePointArc((-8.5, 125.75), (-10.444542192, 124.944545105), (-11.25, 123.000004119))
            Line((-11.25, 123.000004119), (-11.25, 103.5))
            Line((-11.25, 103.5), (-11.25, 98.5))
            Line((-11.25, 98.5), (-11.25, 79))
            ThreePointArc((-11.25, 79), (-11.030330086, 78.469669914), (-10.5, 78.25))
        make_face()
        with Locations((0, 102)):
            Rectangle(SKETCH75_W, SKETCH75_H, mode=Mode.SUBTRACT)
    extrude(amount=BOSS_EXTRUDE39_DEPTH)

    # Sketch76 → Boss-Extrude40 (add)
    with BuildSketch(Plane(origin=(0, 86.25, 0), x_dir=(1, 0, 0), z_dir=(0, 1, 0))):
        with Locations((0, -31.25)):
            Rectangle(SKETCH76_W, SKETCH76_H)
    extrude(amount=BOSS_EXTRUDE40_DEPTH)

    # Sketch77 → Cut-Extrude34 (cut)
    with BuildSketch(Plane(origin=(0, 0, 29.25), x_dir=(-1, 0, 0), z_dir=(0, 0, -1))):
        with Locations((-10, 100.99873461)):
            Rectangle(SKETCH77_W, SKETCH77_H)
        with Locations((10, 101)):
            Rectangle(SKETCH77_W, SKETCH77_H_2)
    extrude(amount=-CUT_EXTRUDE34_DEPTH, mode=Mode.SUBTRACT)

    # Sketch78 → Cut-Extrude35 (cut)
    with BuildSketch(Plane.XY.offset(32.25)):
        with Locations((10.875, 100.998717158)):
            Rectangle(SKETCH78_W, SKETCH78_H)
        with Locations((-10.875, 101)):
            Rectangle(SKETCH78_W, SKETCH78_H_2)
    extrude(amount=-CUT_EXTRUDE35_DEPTH, mode=Mode.SUBTRACT)

    # Sketch79 → Boss-Extrude42 (add)
    with BuildSketch(Plane.XY.offset(32.25)):
        with Locations((9.875, 100.99873461)):
            Rectangle(SKETCH79_W, SKETCH79_H)
        with Locations((-9.9375, 101)):
            Rectangle(SKETCH79_W_2, SKETCH79_H_2)
    extrude(amount=-BOSS_EXTRUDE42_DEPTH)

    # Sketch80 → Cut-Extrude37 (cut)
    with BuildSketch(Plane.XY.offset(32.25)):
        with Locations((0, 89.25)):
            Circle(SKETCH80_R)
    extrude(amount=-CUT_EXTRUDE37_DEPTH, mode=Mode.SUBTRACT)


solid = body_2_3_1.part
